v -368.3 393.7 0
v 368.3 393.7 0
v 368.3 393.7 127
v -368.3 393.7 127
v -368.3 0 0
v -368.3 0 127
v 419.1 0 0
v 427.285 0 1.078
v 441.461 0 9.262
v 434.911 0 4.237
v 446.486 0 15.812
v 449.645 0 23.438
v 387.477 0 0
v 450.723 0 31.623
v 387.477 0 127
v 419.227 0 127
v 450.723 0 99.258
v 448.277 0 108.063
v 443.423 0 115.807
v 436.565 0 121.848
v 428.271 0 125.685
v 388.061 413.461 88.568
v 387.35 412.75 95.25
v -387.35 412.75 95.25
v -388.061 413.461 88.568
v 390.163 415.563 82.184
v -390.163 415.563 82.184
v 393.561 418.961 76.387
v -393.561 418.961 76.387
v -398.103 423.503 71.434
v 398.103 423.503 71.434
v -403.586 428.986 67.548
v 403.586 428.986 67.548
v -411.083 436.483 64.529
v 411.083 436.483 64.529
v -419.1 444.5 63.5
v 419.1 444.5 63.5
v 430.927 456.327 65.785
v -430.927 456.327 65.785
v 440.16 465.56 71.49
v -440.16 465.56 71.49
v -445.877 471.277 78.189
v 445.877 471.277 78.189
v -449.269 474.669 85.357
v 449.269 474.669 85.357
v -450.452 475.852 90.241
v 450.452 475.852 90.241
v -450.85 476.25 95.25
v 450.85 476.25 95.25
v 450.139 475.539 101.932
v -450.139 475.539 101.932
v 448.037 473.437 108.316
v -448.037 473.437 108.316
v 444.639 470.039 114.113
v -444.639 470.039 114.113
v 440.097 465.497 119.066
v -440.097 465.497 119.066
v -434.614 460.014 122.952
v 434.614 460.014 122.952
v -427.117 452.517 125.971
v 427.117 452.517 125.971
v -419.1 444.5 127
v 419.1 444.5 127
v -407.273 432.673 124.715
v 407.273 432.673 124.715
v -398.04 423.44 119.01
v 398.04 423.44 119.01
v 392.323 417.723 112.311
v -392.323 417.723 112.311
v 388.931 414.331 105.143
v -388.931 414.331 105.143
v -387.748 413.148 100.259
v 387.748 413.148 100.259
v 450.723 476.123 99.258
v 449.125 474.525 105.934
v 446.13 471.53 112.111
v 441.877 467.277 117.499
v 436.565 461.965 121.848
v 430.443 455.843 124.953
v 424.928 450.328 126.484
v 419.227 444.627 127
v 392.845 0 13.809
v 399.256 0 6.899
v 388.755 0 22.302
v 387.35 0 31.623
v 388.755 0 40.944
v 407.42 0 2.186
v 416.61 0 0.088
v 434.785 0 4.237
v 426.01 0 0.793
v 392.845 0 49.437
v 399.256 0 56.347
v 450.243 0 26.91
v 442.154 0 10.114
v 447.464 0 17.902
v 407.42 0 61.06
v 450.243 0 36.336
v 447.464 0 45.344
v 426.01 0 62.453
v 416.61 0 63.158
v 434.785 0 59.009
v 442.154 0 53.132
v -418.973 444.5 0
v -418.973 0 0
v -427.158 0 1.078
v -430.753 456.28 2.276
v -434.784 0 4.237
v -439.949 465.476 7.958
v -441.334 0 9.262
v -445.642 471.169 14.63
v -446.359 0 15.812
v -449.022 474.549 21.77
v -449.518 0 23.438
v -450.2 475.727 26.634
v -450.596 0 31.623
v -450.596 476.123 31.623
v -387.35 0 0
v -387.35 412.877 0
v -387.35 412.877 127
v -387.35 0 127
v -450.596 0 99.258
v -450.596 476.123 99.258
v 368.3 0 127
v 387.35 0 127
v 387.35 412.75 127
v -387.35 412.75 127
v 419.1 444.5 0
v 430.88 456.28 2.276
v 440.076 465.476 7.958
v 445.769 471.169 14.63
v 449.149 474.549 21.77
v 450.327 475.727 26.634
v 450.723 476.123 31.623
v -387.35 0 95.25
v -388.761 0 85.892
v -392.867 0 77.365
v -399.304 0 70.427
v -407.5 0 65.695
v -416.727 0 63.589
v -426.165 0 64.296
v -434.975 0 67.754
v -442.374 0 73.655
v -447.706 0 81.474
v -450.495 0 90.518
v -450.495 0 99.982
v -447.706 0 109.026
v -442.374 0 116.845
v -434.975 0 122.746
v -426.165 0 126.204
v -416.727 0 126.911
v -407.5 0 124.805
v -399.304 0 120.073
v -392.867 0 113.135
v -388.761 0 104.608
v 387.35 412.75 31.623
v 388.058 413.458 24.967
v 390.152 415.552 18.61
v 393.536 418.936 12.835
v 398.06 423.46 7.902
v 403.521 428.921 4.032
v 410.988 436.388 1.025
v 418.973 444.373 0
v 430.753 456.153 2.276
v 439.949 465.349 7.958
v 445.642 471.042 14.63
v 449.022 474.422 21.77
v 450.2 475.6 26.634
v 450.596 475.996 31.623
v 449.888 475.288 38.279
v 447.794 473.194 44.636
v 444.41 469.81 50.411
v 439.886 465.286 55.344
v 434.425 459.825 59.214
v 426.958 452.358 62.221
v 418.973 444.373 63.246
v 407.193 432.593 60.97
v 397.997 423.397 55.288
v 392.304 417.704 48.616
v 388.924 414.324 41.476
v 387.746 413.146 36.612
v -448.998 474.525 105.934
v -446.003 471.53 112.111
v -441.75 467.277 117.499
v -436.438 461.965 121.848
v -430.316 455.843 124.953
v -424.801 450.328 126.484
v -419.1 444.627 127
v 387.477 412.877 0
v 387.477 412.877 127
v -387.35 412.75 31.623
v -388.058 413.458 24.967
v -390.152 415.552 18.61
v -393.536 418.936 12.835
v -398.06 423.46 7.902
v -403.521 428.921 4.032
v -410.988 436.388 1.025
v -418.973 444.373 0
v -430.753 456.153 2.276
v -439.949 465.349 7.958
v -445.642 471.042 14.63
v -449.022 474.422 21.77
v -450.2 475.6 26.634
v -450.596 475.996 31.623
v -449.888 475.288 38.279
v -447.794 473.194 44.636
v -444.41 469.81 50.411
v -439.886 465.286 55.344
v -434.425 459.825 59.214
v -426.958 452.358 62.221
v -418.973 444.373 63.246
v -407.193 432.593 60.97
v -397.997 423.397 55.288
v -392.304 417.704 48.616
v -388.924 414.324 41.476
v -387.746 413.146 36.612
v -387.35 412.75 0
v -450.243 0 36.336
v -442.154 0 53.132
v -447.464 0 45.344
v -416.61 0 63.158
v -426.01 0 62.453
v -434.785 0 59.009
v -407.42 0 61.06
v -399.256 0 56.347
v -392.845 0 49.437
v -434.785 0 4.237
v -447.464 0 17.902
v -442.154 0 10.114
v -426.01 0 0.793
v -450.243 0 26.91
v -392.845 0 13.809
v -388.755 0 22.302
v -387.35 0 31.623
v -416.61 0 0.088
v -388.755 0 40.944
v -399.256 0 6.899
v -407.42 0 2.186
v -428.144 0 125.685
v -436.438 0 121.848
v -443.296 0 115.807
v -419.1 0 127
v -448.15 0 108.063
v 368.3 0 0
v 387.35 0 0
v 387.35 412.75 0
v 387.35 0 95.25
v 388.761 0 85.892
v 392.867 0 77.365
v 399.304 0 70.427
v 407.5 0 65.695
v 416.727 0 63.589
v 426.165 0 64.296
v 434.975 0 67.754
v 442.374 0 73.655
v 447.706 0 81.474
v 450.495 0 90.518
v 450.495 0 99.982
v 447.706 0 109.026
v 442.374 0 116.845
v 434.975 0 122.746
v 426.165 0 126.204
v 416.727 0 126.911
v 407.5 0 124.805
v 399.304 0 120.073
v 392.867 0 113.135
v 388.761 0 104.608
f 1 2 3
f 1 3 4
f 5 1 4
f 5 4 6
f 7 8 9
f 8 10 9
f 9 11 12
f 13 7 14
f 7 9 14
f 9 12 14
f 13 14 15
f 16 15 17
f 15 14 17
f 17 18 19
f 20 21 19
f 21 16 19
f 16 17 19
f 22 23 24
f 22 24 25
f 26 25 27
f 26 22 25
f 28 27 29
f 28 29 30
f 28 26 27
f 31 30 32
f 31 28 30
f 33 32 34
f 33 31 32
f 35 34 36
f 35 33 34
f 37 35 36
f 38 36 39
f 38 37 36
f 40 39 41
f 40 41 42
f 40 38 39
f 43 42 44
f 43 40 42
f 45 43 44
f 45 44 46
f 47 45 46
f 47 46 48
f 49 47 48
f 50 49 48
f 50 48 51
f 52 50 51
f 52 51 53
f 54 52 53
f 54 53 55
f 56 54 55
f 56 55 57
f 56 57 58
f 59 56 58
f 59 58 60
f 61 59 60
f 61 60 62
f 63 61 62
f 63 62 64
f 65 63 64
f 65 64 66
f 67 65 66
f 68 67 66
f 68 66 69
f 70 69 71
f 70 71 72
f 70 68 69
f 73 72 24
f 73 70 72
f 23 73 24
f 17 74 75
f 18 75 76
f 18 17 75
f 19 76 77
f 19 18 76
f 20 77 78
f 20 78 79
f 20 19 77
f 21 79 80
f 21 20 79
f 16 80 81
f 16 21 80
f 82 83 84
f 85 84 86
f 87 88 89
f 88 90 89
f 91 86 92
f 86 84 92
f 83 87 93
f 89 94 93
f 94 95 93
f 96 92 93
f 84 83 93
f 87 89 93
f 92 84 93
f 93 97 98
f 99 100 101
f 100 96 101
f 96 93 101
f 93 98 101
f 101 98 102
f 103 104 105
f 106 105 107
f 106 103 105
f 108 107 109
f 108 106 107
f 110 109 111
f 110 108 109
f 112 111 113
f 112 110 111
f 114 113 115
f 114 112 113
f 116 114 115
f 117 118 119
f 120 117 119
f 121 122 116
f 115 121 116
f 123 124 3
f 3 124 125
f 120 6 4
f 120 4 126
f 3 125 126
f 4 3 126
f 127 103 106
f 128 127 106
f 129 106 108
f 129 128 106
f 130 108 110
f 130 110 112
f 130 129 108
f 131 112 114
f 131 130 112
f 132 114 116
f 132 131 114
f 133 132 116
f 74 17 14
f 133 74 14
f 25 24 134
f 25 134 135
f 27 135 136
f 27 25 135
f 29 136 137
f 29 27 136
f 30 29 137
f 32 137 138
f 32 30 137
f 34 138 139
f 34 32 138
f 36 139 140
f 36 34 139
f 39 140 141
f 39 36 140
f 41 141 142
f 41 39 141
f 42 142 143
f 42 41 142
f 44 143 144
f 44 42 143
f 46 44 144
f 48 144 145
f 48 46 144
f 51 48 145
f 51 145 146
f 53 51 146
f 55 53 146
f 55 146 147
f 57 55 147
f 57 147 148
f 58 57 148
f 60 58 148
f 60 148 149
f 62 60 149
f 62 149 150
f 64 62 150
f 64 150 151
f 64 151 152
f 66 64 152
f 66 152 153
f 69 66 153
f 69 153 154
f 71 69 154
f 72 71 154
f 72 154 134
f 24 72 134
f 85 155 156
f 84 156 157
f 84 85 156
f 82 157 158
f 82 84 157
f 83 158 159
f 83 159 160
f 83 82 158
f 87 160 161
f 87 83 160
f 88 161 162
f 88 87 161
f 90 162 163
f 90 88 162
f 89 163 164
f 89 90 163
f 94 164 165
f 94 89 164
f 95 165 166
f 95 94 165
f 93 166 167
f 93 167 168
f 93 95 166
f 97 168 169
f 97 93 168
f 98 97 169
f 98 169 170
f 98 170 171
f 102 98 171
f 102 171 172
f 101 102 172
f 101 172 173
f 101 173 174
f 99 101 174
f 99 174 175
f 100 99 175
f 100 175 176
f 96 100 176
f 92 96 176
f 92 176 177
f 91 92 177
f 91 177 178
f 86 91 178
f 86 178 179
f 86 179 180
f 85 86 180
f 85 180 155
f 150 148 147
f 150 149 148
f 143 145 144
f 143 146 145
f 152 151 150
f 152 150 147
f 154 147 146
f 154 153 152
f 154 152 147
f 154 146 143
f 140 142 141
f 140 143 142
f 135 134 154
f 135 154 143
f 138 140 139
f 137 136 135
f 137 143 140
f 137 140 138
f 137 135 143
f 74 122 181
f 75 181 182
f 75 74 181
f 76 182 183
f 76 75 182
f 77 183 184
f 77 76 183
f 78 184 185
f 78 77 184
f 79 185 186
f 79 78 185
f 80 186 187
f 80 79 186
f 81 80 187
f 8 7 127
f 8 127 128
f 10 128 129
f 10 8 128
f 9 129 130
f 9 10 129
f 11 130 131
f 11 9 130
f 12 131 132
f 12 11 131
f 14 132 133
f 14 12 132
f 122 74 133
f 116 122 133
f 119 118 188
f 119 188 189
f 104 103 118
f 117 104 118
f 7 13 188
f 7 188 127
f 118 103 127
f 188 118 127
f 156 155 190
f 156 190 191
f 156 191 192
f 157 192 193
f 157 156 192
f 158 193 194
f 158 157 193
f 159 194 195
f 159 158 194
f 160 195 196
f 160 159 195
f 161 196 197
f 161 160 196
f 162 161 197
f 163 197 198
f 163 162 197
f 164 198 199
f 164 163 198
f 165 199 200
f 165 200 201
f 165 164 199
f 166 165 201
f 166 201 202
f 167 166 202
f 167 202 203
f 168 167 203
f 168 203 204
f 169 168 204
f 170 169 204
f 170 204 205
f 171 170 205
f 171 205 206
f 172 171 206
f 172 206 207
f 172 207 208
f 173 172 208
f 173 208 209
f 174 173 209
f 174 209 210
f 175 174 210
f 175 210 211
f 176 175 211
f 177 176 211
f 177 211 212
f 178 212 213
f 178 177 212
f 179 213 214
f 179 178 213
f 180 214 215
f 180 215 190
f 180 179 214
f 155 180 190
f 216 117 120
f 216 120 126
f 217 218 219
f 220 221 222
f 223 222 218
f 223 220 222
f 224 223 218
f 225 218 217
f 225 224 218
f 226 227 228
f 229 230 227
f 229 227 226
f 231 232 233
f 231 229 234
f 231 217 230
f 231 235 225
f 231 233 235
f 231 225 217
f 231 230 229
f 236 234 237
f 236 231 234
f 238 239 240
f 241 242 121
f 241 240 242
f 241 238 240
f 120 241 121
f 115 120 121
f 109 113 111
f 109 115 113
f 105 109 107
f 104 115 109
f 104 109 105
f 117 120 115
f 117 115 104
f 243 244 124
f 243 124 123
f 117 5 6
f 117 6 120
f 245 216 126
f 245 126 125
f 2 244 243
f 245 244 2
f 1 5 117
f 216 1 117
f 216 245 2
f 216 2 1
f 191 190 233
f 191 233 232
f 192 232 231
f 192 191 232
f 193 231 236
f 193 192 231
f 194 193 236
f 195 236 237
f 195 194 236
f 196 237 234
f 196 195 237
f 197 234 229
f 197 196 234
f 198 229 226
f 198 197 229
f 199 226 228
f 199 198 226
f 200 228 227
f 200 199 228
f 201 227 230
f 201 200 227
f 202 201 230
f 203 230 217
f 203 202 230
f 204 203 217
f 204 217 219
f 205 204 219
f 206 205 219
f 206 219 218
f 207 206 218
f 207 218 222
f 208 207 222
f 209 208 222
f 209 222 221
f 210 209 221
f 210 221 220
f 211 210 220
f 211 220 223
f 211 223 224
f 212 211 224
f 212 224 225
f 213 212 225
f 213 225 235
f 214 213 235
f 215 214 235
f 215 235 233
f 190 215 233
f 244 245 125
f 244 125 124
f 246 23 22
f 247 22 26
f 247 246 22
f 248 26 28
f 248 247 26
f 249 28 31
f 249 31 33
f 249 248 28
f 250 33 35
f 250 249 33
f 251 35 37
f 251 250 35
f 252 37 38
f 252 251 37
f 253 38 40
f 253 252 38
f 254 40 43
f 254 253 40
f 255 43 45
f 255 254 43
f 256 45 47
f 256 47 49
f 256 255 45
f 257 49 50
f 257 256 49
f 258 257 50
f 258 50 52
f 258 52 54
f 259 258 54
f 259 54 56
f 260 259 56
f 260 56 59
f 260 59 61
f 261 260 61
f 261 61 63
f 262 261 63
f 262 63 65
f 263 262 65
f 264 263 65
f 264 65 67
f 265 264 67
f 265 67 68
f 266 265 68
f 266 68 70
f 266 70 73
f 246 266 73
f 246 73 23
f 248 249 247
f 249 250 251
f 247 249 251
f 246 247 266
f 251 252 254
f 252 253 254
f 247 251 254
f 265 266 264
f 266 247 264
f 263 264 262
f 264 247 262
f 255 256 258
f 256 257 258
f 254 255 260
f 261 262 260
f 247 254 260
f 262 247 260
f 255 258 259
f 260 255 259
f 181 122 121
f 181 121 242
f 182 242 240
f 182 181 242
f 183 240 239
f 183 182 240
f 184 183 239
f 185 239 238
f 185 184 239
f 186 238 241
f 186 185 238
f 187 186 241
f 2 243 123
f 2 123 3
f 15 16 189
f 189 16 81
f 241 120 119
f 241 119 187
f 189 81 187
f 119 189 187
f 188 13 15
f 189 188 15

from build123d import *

# Parameters (mm, degrees)
PLYWOOD_DEPTH = 127
SKETCH2_R     = 31.75
SKETCH2_R_2   = 31.623


with BuildPart() as part:
    # Sketch1 → Plywood (new body)
    with BuildSketch(Plane.XY):
        Polygon((-387.35, 0), (-387.35, 412.75), (387.35, 412.75), (387.35, 0), (368.3, 0), (368.3, 393.7), (-368.3, 393.7), (-368.3, 0), align=None)
    extrude(amount=PLYWOOD_DEPTH)


with BuildPart() as body_2:
    # Sweep1: sweep along a path in Sketch3
    with BuildLine(Plane.XY.offset(95.25)) as sweep1_path:
        Line((-419.1, 0), (-419.1, 444.5))
        Line((-419.1, 444.5), (419.1, 444.5))
        Line((419.1, 444.5), (419.1, 0))
    # Sketch2 → Sweep1 (sweep)
    with BuildSketch(Plane.XZ):
        with Locations((-419.1, 95.25)):
            Circle(SKETCH2_R)
        with Locations((-418.973, 31.623)):
            Circle(SKETCH2_R_2)
    sweep(path=sweep1_path.line, transition=Transition.RIGHT)


with BuildPart() as body_3:
    # Sweep2: sweep along a path in Sketch4
    with BuildLine(Plane.XY.offset(31.623)) as sweep2_path:
        Line((-418.973, 0), (-418.973, 444.5))
        Line((-418.973, 444.5), (419.1, 444.5))
        Line((419.1, 444.5), (419.1, 0))
    # Sketch6 → Sweep2 (sweep)
    with BuildSketch(Plane.XZ):
        with BuildLine():
            Line((-418.973, 0), (-387.35, 0))
            Line((-387.35, 0), (-387.35, 127))
            Line((-387.35, 127), (-419.1, 127))
            ThreePointArc((-419.1, 127), (-440.085790865, 119.075597196), (-450.596, 99.258052395))
            Line((-450.596, 99.258052395), (-450.596, 91.241947605))
            Line((-450.596, 91.241947605), (-450.596, 31.623))
            ThreePointArc((-450.596, 31.623), (-441.333837741, 9.262162259), (-418.973, 0))
        make_face()
    sweep(path=sweep2_path.line, transition=Transition.RIGHT)


solid = Compound([part.part, body_2.part, body_3.part])
